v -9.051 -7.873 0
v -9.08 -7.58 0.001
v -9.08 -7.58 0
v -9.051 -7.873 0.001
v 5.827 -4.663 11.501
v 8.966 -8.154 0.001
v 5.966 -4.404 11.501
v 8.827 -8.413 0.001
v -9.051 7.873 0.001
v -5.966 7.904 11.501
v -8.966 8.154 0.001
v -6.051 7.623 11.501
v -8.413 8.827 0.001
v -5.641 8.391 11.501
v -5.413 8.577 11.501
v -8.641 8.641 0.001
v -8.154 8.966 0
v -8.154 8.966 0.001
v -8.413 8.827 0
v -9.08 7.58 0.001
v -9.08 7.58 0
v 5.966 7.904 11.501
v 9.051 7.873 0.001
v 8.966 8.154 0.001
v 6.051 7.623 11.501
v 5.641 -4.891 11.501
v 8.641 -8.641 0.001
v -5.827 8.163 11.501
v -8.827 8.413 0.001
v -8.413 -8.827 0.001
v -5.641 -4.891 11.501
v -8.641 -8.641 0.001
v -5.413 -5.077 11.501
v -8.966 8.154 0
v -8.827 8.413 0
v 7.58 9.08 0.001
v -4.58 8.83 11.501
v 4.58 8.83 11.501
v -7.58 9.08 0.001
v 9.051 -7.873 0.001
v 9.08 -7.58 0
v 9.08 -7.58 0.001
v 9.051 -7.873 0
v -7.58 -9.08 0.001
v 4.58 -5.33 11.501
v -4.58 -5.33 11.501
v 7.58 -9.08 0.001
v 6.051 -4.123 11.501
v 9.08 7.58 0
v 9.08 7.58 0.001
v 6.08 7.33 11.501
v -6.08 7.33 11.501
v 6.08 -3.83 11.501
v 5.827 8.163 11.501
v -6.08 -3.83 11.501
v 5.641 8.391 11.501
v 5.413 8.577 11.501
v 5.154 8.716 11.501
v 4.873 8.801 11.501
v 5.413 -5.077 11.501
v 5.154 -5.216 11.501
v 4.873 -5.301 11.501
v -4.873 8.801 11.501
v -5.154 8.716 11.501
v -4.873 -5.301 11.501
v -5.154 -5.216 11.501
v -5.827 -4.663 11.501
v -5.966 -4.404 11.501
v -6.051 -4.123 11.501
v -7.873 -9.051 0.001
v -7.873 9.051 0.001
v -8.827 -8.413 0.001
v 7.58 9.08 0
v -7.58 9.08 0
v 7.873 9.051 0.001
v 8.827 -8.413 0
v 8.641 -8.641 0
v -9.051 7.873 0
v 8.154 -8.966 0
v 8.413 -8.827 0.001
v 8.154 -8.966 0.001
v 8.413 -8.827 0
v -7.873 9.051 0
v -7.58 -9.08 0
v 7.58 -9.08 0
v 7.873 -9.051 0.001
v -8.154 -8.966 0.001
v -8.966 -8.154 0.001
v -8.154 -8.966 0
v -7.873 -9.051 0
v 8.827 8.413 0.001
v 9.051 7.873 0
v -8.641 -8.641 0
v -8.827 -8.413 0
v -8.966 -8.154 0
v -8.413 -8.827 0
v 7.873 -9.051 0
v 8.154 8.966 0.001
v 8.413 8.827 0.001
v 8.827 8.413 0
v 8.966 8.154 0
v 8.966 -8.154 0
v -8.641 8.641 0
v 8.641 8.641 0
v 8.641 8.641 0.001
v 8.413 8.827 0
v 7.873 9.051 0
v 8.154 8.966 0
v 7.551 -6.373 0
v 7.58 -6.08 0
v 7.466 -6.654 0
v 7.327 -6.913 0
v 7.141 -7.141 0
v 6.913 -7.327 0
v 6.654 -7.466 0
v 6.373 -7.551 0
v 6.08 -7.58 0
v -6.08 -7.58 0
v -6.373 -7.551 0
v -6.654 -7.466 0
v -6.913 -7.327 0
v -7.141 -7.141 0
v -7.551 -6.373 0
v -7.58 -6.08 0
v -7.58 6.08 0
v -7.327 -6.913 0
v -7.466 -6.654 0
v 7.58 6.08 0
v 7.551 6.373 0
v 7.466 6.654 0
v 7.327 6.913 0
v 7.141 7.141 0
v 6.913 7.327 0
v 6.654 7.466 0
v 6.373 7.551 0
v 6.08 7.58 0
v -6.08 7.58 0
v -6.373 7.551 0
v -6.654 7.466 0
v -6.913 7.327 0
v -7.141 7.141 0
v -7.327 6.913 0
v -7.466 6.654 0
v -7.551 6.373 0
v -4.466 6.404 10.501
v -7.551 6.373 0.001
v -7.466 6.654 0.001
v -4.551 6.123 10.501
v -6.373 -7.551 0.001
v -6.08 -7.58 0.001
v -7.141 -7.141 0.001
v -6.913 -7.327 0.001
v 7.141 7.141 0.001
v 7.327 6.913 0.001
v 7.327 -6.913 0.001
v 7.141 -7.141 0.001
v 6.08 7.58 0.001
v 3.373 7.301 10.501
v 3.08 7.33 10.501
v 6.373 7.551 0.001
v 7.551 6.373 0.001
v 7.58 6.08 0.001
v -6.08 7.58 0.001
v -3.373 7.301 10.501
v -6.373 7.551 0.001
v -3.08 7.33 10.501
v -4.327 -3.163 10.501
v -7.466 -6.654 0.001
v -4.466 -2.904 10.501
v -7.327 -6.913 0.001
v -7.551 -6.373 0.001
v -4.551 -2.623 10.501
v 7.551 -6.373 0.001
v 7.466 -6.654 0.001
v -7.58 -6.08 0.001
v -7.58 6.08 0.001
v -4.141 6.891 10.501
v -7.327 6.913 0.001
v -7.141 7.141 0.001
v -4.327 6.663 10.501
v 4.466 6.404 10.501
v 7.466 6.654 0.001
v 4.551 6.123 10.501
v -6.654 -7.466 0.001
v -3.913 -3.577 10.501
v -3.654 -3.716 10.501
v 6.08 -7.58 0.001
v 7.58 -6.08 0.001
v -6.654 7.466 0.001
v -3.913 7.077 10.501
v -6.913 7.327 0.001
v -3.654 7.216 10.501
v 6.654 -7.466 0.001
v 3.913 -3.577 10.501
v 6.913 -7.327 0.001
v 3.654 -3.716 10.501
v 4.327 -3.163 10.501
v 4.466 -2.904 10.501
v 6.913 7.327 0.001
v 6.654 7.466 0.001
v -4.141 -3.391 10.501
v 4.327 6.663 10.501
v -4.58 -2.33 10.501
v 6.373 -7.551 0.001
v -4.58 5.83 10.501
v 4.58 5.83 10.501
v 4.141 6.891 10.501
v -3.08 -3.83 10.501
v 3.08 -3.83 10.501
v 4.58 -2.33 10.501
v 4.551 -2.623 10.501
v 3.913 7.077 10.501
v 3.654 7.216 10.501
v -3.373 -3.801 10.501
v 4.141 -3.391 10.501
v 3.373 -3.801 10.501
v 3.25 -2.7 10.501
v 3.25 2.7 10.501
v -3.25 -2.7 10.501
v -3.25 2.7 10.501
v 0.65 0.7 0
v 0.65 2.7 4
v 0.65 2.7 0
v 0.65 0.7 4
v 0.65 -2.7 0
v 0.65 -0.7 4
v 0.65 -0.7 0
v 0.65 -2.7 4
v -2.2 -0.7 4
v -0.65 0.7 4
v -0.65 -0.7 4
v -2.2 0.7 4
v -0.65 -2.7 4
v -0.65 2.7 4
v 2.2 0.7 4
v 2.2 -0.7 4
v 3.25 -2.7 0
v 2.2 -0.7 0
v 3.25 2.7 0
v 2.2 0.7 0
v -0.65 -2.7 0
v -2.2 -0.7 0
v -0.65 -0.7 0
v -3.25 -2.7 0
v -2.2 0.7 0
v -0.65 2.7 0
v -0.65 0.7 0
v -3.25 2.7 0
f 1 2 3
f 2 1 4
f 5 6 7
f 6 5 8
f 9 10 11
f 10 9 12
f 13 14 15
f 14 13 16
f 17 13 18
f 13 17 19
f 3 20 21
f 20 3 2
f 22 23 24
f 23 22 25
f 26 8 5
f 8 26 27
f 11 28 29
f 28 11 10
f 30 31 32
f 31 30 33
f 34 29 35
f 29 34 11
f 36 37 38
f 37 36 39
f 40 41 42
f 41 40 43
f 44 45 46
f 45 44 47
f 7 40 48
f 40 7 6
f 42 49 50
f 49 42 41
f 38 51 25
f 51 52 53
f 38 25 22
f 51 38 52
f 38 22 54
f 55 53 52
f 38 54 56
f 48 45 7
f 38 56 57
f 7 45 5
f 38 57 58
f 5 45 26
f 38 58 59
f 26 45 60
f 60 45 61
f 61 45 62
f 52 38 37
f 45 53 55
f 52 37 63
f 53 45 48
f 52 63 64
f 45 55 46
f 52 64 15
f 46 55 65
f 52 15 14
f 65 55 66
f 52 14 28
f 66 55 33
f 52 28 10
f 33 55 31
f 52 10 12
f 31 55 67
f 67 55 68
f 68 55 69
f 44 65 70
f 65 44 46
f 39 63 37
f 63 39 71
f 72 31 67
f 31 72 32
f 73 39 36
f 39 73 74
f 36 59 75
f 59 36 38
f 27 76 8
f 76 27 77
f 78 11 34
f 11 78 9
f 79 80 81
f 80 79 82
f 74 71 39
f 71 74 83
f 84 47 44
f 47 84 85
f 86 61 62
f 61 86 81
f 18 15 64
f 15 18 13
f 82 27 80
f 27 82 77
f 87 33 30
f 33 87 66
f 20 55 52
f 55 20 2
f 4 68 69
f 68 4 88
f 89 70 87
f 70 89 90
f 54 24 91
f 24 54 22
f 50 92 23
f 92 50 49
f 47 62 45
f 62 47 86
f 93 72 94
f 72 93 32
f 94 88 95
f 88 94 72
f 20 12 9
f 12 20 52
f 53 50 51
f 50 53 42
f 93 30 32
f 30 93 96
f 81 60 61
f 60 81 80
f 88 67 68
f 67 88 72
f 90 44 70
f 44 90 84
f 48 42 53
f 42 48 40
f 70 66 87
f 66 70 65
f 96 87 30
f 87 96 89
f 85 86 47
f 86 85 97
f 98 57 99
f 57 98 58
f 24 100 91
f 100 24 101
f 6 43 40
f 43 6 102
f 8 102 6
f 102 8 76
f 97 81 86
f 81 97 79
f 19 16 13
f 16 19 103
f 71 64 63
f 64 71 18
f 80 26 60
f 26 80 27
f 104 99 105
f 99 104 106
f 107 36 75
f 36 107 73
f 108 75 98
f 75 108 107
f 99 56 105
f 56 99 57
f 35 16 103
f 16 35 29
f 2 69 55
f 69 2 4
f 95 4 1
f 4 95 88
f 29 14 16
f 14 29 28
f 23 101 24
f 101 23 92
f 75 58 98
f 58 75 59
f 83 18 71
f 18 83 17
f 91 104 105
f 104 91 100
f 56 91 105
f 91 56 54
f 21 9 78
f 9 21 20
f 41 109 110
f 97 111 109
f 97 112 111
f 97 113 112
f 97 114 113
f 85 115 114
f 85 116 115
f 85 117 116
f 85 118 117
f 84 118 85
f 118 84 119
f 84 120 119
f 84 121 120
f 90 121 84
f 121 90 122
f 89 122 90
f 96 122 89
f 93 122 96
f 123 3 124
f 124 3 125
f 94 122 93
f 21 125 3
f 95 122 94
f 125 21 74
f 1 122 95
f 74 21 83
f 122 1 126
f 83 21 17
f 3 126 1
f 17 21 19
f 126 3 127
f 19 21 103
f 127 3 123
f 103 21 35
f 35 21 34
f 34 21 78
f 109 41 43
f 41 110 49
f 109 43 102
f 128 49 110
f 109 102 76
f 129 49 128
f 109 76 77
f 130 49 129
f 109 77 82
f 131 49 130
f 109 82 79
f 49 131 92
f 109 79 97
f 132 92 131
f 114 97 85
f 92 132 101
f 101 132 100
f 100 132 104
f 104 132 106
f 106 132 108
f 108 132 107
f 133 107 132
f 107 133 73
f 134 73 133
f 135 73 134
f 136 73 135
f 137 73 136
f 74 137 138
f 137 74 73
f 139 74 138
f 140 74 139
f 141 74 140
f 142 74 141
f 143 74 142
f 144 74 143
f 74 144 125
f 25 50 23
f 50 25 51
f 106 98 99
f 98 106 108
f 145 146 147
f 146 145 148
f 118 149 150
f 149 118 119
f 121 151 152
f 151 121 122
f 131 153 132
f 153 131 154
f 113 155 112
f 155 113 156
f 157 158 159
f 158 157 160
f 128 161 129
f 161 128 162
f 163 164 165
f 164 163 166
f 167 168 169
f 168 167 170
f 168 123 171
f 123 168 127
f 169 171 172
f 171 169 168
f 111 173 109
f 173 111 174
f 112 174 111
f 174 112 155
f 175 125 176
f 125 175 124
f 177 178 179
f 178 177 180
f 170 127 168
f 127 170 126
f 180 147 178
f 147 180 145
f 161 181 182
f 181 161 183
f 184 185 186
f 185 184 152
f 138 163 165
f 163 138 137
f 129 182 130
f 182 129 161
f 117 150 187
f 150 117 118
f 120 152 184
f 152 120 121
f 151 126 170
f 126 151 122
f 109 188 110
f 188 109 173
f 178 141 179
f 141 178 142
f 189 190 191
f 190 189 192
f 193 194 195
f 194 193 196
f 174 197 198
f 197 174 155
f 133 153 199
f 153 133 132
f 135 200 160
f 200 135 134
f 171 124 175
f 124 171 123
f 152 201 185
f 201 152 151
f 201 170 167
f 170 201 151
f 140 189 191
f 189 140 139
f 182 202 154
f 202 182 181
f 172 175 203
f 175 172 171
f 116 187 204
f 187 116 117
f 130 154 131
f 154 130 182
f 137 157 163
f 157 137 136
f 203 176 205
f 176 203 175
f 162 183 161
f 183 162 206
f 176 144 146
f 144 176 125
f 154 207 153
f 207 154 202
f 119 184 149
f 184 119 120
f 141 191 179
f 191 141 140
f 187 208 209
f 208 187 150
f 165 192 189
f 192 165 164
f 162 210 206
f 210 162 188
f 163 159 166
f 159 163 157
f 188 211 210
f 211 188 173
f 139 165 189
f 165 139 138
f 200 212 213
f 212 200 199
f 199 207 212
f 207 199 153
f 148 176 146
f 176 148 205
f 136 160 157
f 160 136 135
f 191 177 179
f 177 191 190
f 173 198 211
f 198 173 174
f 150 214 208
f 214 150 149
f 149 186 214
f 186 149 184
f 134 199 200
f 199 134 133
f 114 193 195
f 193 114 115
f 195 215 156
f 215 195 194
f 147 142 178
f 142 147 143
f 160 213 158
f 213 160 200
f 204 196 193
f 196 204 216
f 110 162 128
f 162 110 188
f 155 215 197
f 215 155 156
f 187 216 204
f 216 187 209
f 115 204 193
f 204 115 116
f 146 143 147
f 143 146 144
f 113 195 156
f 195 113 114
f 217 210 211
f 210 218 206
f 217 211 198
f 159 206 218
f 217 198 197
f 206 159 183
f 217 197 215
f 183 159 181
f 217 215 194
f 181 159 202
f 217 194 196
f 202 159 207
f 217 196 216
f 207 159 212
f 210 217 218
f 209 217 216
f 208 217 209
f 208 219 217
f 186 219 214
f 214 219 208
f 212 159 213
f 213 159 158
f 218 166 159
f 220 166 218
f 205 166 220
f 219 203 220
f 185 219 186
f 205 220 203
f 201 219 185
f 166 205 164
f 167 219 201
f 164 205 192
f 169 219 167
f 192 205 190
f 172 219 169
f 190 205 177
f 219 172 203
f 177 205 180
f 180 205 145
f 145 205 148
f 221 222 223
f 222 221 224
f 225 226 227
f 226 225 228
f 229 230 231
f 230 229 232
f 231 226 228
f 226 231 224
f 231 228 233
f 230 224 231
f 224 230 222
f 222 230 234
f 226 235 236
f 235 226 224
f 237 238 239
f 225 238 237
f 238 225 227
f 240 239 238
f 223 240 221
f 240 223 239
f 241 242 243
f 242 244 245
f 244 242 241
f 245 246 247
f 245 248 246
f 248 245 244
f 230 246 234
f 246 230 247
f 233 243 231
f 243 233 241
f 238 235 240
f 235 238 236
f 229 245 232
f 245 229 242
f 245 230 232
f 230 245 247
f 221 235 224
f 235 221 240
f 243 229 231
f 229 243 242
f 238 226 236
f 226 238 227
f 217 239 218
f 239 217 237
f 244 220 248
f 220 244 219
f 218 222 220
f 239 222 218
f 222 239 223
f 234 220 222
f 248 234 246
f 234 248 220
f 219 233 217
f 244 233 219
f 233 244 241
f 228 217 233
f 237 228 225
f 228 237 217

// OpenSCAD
/* [Key] */

//length in units of key
key_length = 1;
//height in units of key. should remain 1 for most uses
key_height = 1;
//keycap type, [0:DCS Row 5, 1:DCS Row 1, 2:DCS Row 2, 3:DCS Row 3, 4:DCS Row 4, 5:DSA Row 3, 6:SA Row 1, 7:SA Row 2, 8:SA Row 3, 9:SA Row 4, 10:DCS Row 4 Spacebar, 11: g20 key (faked)]
key_profile_index = 0;

// keytop thickness, aka how many millimeters between the inside and outside of the top surface of the key
keytop_thickness = 1;

// wall thickness, aka the thickness of the sides of the keycap. note this is the total thickness, aka 3 = 1.5mm walls
wall_thickness = 3;

/* [Brim] */
//enable brim for connector
has_brim = 0;
//brim radius. 11 ensconces normal keycap stem in normal keycap
brim_radius = 11;
//brim depth
brim_depth = .3;

/* [Stabilizers] */
//whether stabilizer connectors are enabled
stabilizers = 0;
//stabilizer distance in mm
stabilizer_distance = 50;

/* [Dish] */
// invert dishing. mostly for spacebar
inverted_dish = 0;

/* [Stem] */
// cherry MX or Alps stem, or totally broken circular cherry stem [0..2]
stem_profile = 0;
// how inset the stem is from the bottom of the key. experimental. requires support
stem_inset = 0;
// stem offset in units NOT MM. for stepped caps lock
stem_offset = 0;

/* [Hidden] */
//change to round things better
$fn = 32;
//beginning to use unit instead of baked in 19.05
unit = 19.05;

//minkowski radius. radius of sphere used in minkowski sum for minkowski_key function. 1.75 default for faux G20
minkowski_radius = 1.75;

letter = "3";
letter2 = "#";
key_type = 2;
print_text_only = 0;
//profile specific stuff

/*  *****************************************************
    ** RUNNING AREA                                     *
    **                                                  *
    ** Because of a lack of multi-material support      *
    ** we need to run the key creator and text creator  *
    ** separately and save each for merging on a slicer *
    **                                                  *
    ** doKeyList will take the text from keys and print *
    ** single character keys                            *
    **                                                  *
    ** doDoubleKeyList will take the text from          *
    ** doubleKeys and print a two part key with the     *
    ** text in either corner of the key                 *
    *****************************************************/
    
//keys = ["Z", "X", "C", "V", "B", "N", "M"];
keys = [""];
//doubleKeys = [["<","["],[">","]"],["+","="],["~","^"],["%","@"],["?",","],[".",";"],["/",":"],["*","\\"]];
doubleKeys = [["+","+"]];

//color("red") doKeyList();
//color("white") children();

//doDoubleKeyList(1);
doKeyList(0);
//key();

/*
 Here we have, for lack of a better implementation, an array
 that defines the more intimate aspects of a key.
 order is thus:
 1. Bottom Key Width: width of the immediate bottom of the key
 2. Bottom Key Height: height of the immediate bottom of the key
 3. Top Key Width Difference: mm to subtract from bottom key width to create top key width
 4. Top Key Height Difference: mm to subtract from bottom key height to create top key height
 5. total Depth: how tall the total in the switch is before dishing
 6. Top Tilt: X rotation of the top. Top and dish obj are rotated
 7. Top Skew: Y skew of the top of the key relative to the bottom. DCS has some, DSA has none (its centered)
 8. Dish Type: type of dishing. check out dish function for the options
 9. Dish Depth: how many mm to cut into the key with
 10. Dish Radius: radius of dish obj, the Sphere or Cylinder that cuts into the keycap
*/

key_profiles = [

	//DCS Profile

	[ //DCS ROW 5
		18.16,  // Bottom Key Width
		18.16,  // Bottom Key Height
		6,   // Top Key Width Difference
		4,   // Top Key Height Difference
		11.5, // total Depth
		-6,  // Top Tilt
		1.75,// Top Skew

		//Dish Profile

		0,   // Dish Type
		1,   // Dish Depth
		0,   // Dish Skew X
		0    // DIsh Skew Y
	],
	[ //DCS ROW 1
		18.16,  // Bottom Key Width
		18.16,  // Bottom Key Height
		6,   // Top Key Width Difference
		4,   // Top Key Height Difference
		8.5, // total Depth
		-1,  // Top Tilt
		1.75,// Top Skew

		//Dish Profile

		0,   // Dish Type
		1,   // Dish Depth
		0,   // Dish Skew X
		0    // DIsh Skew Y
	],
	[ //DCS ROW 2
		18.16,  // Bottom Key Width
		18.16,  // Bottom Key Height
		6.2,   // Top Key Width Difference
		4,   // Top Key Height Difference
		7.5, // total Depth
		3,  // Top Tilt
		1.75,// Top Skew

		//Dish Profile

		0,   // Dish Type
		1,   // Dish Depth
		0,   // Dish Skew X
		0    // DIsh Skew Y
	],
	[ //DCS ROW 3
		18.16,  // Bottom Key Width
		18.16,  // Bottom Key Height
		6,   // Top Key Width Difference
		4,   // Top Key Height Difference
		6.2, // total Depth
		7,  // Top Tilt
		1.75,// Top Skew

		//Dish Profile

		0,   // Dish Type
		1,   // Dish Depth
		0,   // Dish Skew X
		0    // DIsh Skew Y
	],
	[ //DCS ROW 4
		18.16,  // Bottom Key Width
		18.16,  // Bottom Key Height
		6,   // Top Key Width Difference
		4,   // Top Key Height Difference
		6.2, // total Depth
		16,  // Top Tilt
		1.75,// Top Skew

		//Dish Profile

		0,   // Dish Type
		1,   // Dish Depth
		0,   // Dish Skew X
		0    // DIsh Skew Y
	],

	//DSA Profile

	[ //DSA ROW 3
	  18.4,  // Bottom Key Width
	  18.4,  // Bottom Key Height
	  5.7, // Top Key Width Difference
	  5.7, // Top Key Height Difference
	  7.4, // total Depth
	  0,   // Top Tilt
	  0,   // Top Skew

	  //Dish Profile

	  1,   // Dish Type
	  1.2, // Dish Depth
	  0,   // Dish Skew X
	  0    // DIsh Skew Y
	],

	//SA Proile

	[ //SA ROW 1
		18.4,  // Bottom Key Width
	  18.4,  // Bottom Key Height
	  5.7, // Top Key Width Difference
	  5.7, // Top Key Height Difference
	  13.73, // total Depth, fudged
	  -14,   // Top Tilt
	  0,   // Top Skew

	  //Dish Profile

	  1,   // Dish Type
	  1.2, // Dish Depth
	  0,   // Dish Skew X
	  0    // DIsh Skew Y
	],
	[ //SA ROW 2
		18.4,  // Bottom Key Width
	  18.4,  // Bottom Key Height
	  5.7, // Top Key Width Difference
	  5.7, // Top Key Height Difference
	  11.73, // total Depth
	  -7,   // Top Tilt
	  0,   // Top Skew

	  //Dish Profile

	  1,   // Dish Type
	  1.2, // Dish Depth
	  0,   // Dish Skew X
	  0    // DIsh Skew Y
	],
	[ //SA ROW 3
		18.4,  // Bottom Key Width
	  18.4,  // Bottom Key Height
	  5.7, // Top Key Width Difference
	  5.7, // Top Key Height Difference
	  11.73, // total Depth
	  0,   // Top Tilt
	  0,   // Top Skew

	  //Dish Profile

	  1,   // Dish Type
	  1.2, // Dish Depth
	  0,   // Dish Skew X
	  0    // DIsh Skew Y
	],
	[ //SA ROW 4
		18.4,  // Bottom Key Width
	  18.4,  // Bottom Key Height
	  5.7, // Top Key Width Difference
	  5.7, // Top Key Height Difference
	  11.73, // total Depth
	  7,   // Top Tilt
	  0,   // Top Skew

	  //Dish Profile

	  1,   // Dish Type
	  1.2, // Dish Depth
	  0,   // Dish Skew X
	  0    // DIsh Skew Y
	],
	[ //DCS ROW 4 SPACEBAR
		18.16,  // Bottom Key Width
		18.16,  // Bottom Key Height
		6,   // Top Key Width Difference
		4,   // Top Key Height Difference
		6.2, // total Depth
		16,  // Top Tilt
		1.75,// Top Skew

		//Dish Profile

		2,   // Dish Type
		1,   // Dish Depth
		0,   // Dish Skew X
		0    // DIsh Skew Y
	],
	[ //G20 AKA DCS Row 2 with no dish and shorter
		18.16,  // Bottom Key Width
		18.16,  // Bottom Key Height
		2,   // Top Key Width Difference
		2,   // Top Key Height Difference
		6, // total Depth
		2.5,  // Top Tilt
		0.75,// Top Skew

		//Dish Profile

		3,   // Dish Type
		0,   // Dish Depth
		0,   // Dish Skew X
		0    // DIsh Skew Y
	],
	[ //NONWORKING fake ISO enter
		18.16 * 1.5,  // Bottom Key Width
		18.16 * 2,  // Bottom Key Height
		4,   // Top Key Width Difference
		4,   // Top Key Height Difference
		7, // total Depth
		0,  // Top Tilt
		1.75,// Top Skew

		//Dish Profile

		0,   // Dish Type
		1,   // Dish Depth
		0,   // Dish Skew X
		0    // DIsh Skew Y
	],
];

// derived variables
//key profile selected
key_profile = key_profiles[key_profile_index];

// names, so I don't go crazy
bottom_key_width = key_profile[0];
bottom_key_height = key_profile[1];
width_difference = key_profile[2];
height_difference = key_profile[3];
total_depth = key_profile[4];
top_tilt = key_profile[5] / key_height;
top_skew = key_profile[6];
dish_type = key_profile[7];
dish_depth = key_profile[8];
dish_skew_x = key_profile[9];
dish_skew_y = key_profile[10];

// actual mm key width and height
total_key_width = bottom_key_width + (unit * (key_length - 1));
total_key_height = bottom_key_height + (unit * (key_height - 1));

// actual mm key width and height at the top
top_total_key_width = bottom_key_width + (unit * (key_length - 1)) - width_difference;
top_total_key_height = bottom_key_height + (unit * (key_height - 1)) - height_difference;

//centered
module roundedRect(size, radius) {
	x = size[0];
	y = size[1];
	z = size[2];

	translate([-x/2,-y/2,0])
	linear_extrude(height=z)
	hull() {
		translate([radius, radius, 0])
		circle(r=radius);

		translate([x - radius, radius, 0])
		circle(r=radius);

		translate([x - radius, y - radius, 0])
		circle(r=radius);

		translate([radius, y - radius, 0])
		circle(r=radius);
	}
}

// stem related stuff

// bottom we can use to anchor the stem, just a big ol cube with the inside of
// the keycap hollowed out
module inside(){
	difference(){
		translate([0,0,50]) cube([100000,100000,100000],center=true);
		// NOTE: you're saying hey, if this is the inside why aren't we doing
		// wall_thickness, keytop_thickness? well first off congratulations for
		// figuring that out cuz it's a rat's nest in here. second off
		// due to how the minkowski_key function works that isn't working out right
		// now. it's a simple change if is_minkowski is implemented though
		shape(0, 0);
	}
}

module cherry_stem(){
	// cross length
	cross_length = 4.4;
  //extra vertical cross length - the extra length of the up/down bar of the cross
  extra_vertical_cross_length = 1.1;
	//dimensions of connector
	// outer cross extra length in x
	extra_outer_cross_width = 2.10;
	// outer cross extra length in y
	extra_outer_cross_height = 1.0;
	// dimensions of cross
	// horizontal cross bar width
	horizontal_cross_width = 1.4;
	// vertical cross bar width
	vertical_cross_width = 1.3;
	// cross depth, stem height is 3.4mm
	cross_depth = 4;

	difference(){
		union(){
            if (stem_profile != 2){
                translate([
                    -(cross_length+extra_outer_cross_width)/2,
                    -(cross_length+extra_outer_cross_height)/2,
                    stem_inset
                ])
    			cube([ // the base of the stem, the part the cruciform digs into
					cross_length+extra_outer_cross_width,
					cross_length+extra_outer_cross_height,
					50
    			]);
            } else {
                cylinder(
                    d = cross_length+extra_outer_cross_height,
                    h = 50
                );
            }
			if (has_brim == 1){ cylinder(r=brim_radius,h=brim_depth); }
		}
		//the cross part of the steam
		translate([0,0,(cross_depth)/2 + stem_inset]){
	        cube([vertical_cross_width,cross_length+extra_vertical_cross_length,cross_depth], center=true );
	        cube([cross_length,horizontal_cross_width,cross_depth], center=true );
	    }
	}
}

module alps_stem(){
	cross_depth = 40;
	width = 4.45;
	height = 2.25;

	base_width = 12;
	base_height = 15;

	translate([0,0,cross_depth/2 + stem_inset]){
		cube([width,height,cross_depth], center = true);
	}
}

//whole connector, alps or cherry, trimmed to fit
module connector(has_brim){
	difference(){
		//TODO can I really not do an array index here?
		translate([-unit * stem_offset, 0, 0])
		union(){
            if (key_length == 2) {
                if(stem_profile == 0 || stem_profile == 2) translate([12,0,0]) cherry_stem();
                if(stem_profile == 0 || stem_profile == 2) translate([-12,0,0]) cherry_stem();
            } else {
                if(stem_profile == 0 || stem_profile == 2) cherry_stem();
            }
            if(key_length == 10) {
                if(stem_profile == 0 || stem_profile == 2) cherry_stem();
                if(stem_profile == 0 || stem_profile == 2) translate([50,0,0]) cherry_stem();
                if(stem_profile == 0 || stem_profile == 2) translate([-50,0,0]) cherry_stem();
            }
            
			if(stem_profile == 1) alps_stem();
		}
		inside();
	}
}

//stabilizer connectors
module stabilizer_connectors(has_brim){
	translate([stabilizer_distance,0,0]) connector(has_brim);
	translate([-stabilizer_distance,0,0]) connector(has_brim);
}



//shape related stuff




//general shape of key. used for inside and outside
module shape(thickness_difference, depth_difference){
  if (inverted_dish == 1){
		difference(){
			union(){
				shape_hull(thickness_difference, depth_difference, 1);
				dish(depth_difference);
			}
			outside(thickness_difference);
		}
	} else{
		difference(){
			shape_hull(thickness_difference, depth_difference, 1);
			//dish(depth_difference);
		}
	}
}

// conicalish clipping shape to trim things off the outside of the keycap
// literally just a key with height of 2 to make sure nothing goes awry with dishing etc
module outside(thickness_difference){
	difference(){
		cube([100000,100000,100000],center = true);
		shape_hull(thickness_difference, 0, 2);
	}
}

// super basic hull shape without dish
// modifier multiplies the height and top differences of the shape,
// which is only used for dishing to cut the dish off correctly
// height_difference used for keytop thickness
module shape_hull(thickness_difference, depth_difference, modifier){
	hull(){
		// bottom_key_width + (key_length -1) * unit is the correct length of the
		// key. only 1u of the key should be bottom_key_width long; all others
		// should be 1u
		roundedRect([total_key_width - thickness_difference, total_key_height - thickness_difference, .001],1.5);

		//height_difference outside of modifier because that doesnt make sense
		translate([0,top_skew,total_depth * modifier - depth_difference])
		//rotate([-top_tilt,0,0])
		roundedRect([total_key_width - thickness_difference - width_difference * modifier, total_key_height - thickness_difference - height_difference * modifier, .001],1.5);
	}
}



//dish related stuff



//dish selector
module dish(depth_difference){
	if(dish_type == 0){ // cylindrical dish
		cylindrical_dish(depth_difference);
	}
	else if (dish_type == 1) { // spherical dish
		spherical_dish(depth_difference);
	}
	else if (dish_type == 2){ // SIDEWAYS cylindrical dish - used for spacebar
		sideways_cylindrical_dish(depth_difference);
	}
  else if (dish_type == 3){
  	// no dish
  }
}

module cylindrical_dish(depth_difference){
	/* we do some funky math here
	 * basically you want to have the dish "dig in" to the keycap x millimeters
	 * in order to do that you have to solve a small (2d) system of equations
	 * where the chord of the spherical cross section of the dish is
	 * the width of the keycap.
	 */
	// the distance you have to move the dish up so it digs in dish_depth millimeters
	chord_length = (pow(top_total_key_width, 2) - 4 * pow(dish_depth, 2)) / (8 * dish_depth);
	//the radius of the dish
	rad = (pow(top_total_key_width, 2) + 4 * pow(dish_depth, 2)) / (8 * dish_depth);

	if (inverted_dish == 1){
		translate([dish_skew_x, top_skew + dish_skew_y, total_depth - depth_difference])
		rotate([90-top_tilt,0,0])
		translate([0,-chord_length,0])
		cylinder(h=100,r=rad, $fn=1024, center=true);
	}
	else{
		translate([dish_skew_x, top_skew + dish_skew_y, total_depth - depth_difference])
		rotate([90-top_tilt,0,0])
		translate([0,chord_length,0])
		cylinder(h=100,r=rad, $fn=1024, center=true);
	}

}

module spherical_dish(depth_difference){
	//same thing as the cylindrical dish here, but we need the corners to just touch - so we have to find the hypotenuse of the top
	chord = pow((pow(top_total_key_width,2) + pow(top_total_key_height, 2)),0.5); //getting diagonal of the top

	// the distance you have to move the dish up so it digs in dish_depth millimeters
	chord_length = (pow(chord, 2) - 4 * pow(dish_depth, 2)) / (8 * dish_depth);
	//the radius of the dish
	rad = (pow(chord, 2) + 4 * pow(dish_depth, 2)) / (8 * dish_depth);

	if (inverted_dish == 1){
		translate([dish_skew_x, top_skew + dish_skew_y, total_depth - depth_difference])
		rotate([-top_tilt,0,0])
		translate([0,0,-chord_length])
		//NOTE: if your dish is long at all you might need to increase this number
		sphere(r=rad, $fn=512);
	}
	else{
		translate([dish_skew_x, top_skew + dish_skew_y, total_depth - depth_difference])
		rotate([-top_tilt,0,0])
		translate([0,0,chord_length])
		sphere(r=rad, $fn=256);
	}
}

module sideways_cylindrical_dish(depth_difference){
	chord_length = (pow(top_total_key_height, 2) - 4 * pow(dish_depth, 2)) / (8 * dish_depth);
	rad = (pow(top_total_key_height, 2) + 4 * pow(dish_depth, 2)) / (8 * dish_depth);

	if (inverted_dish == 1){
		translate([dish_skew_x, top_skew + dish_skew_y, total_depth - depth_difference])
		rotate([90,top_tilt,90])
		translate([0,-chord_length,0])
		cylinder(h=total_key_width + 20,r=rad, $fn=1024, center=true); // +20 just cuz
	}
	else{
		translate([dish_skew_x, top_skew + dish_skew_y, total_depth - depth_difference])
		rotate([90,top_tilt,90])
		translate([0,chord_length,0])
		cylinder(h=total_key_width + 20,r=rad, $fn=1024, center=true);
	}
}

module keyText(letter, letter2, key_type) {
    if (key_type == 1) {
        if (len(letter) > 1) {
            singleKeyText(letter, 0.5, 3);
        } else {
            singleKeyText(letter, 0.5);
        }
    } else {
        doubleKeyText(letter, letter2);
    }
}

module singleKeyText(letter = "Q", embed = 0.5, textSize = 5, tx = 0, ty = 1, tz = 11.1) {    
    translate([tx,ty,tz])
        //rotate([5,0,0])
    linear_extrude(height=embed, convexity=4)
        color("white") text(letter, 
             size=textSize,
             font="Arial:style=Bold",
             halign="center",
             valign="center");
}

module doubleKeyText(letter1, letter2, embed = 0.5) {
    singleKeyText(letter1, embed, 4, -3, 5, 11.1);
    singleKeyText(letter2, embed, 4, 3, -2, 11.1);
    
    /*translate([-3,5,11.1]) {
        //rotate([5,0,0])
        // convexity is needed for correct preview
        // since characters can be highly concave
        linear_extrude(height=embed, convexity=4)
            text(letter1, 
                 size=4,
                 font="Arial:style=Bold",
                 halign="center",
                 valign="center");
    }
    translate([3,-2,11.1]) {
        // convexity is needed for correct preview
        // since characters can be highly concave
        //rotate([5,0,0])
        linear_extrude(height=embed, convexity=4)
            text(letter2, 
                 size=4,
                 font="Arial:style=Bold",
                 halign="center",
                 valign="center");
    }*/
}

//actual full key with space carved out and keystem/stabilizer connectors
module key(){
	union(){
		difference(){
			shape(0, 0);
			shape(wall_thickness, keytop_thickness);            
		}
	}

	connector(has_brim);

	if (stabilizers == 1){
		stabilizer_connectors(has_brim);
	}
}

// ACTUAL OUTPUT
module doKey(letter = "3", letter2 = "#", key_type = 2, print_text_only = 0) {
    if (print_text_only == 0) {
        difference(){
            key();
            // preview cube, for seeing inside the keycap
            //cube([100,100,100]);
            keyText(letter, letter2, key_type);
        }
    } else {
        keyText(letter, letter2, key_type);
    }
}

module doDoubleKeyList(hideButton = 0) {
    x = 0;
    y = 0;
    
    for (i = [0:len(doubleKeys)-1]) {   
        x = 20 * (i % 4);            
        y = 20 * (round((20 * i) / 80));

        translate([x,y,0])
            doKey(doubleKeys[i][0], doubleKeys[i][1], 2, hideButton);
    }
}

module doKeyList(hideButton = 0) {
    x = 0;
    y = 0;
    
    for (i = [0:len(keys)-1]) {   
        x = 20 * (i % 4);            
        y = 20 * (round((20 * i) / 80));

        translate([x,y,0])
            doKey(keys[i], "", 1, hideButton);
    }
}

//color("white") children();

module children() {
    x = 0;
    y = 0;

    do_letter_only = 1;

    for (i = [0:len(keys)-1]) {   

        x = 20 * (i % 4);            
        y = 20 * (round((20 * i) / 80));
        
        translate([x,y,-0.09])
            doKey(keys[i], "", 1, do_letter_only);
    }
}
//minkowski_key();




// Experimental stuff


// key rounded with minkowski sum. still supports wall and keytop thickness.
// use in actual output section. takes a long time to render with dishes.
// required for keycap 11, G20 keycap.
module minkowski_key(){
	union(){
		difference(){
			minkowski(){
				shape(minkowski_radius*2, minkowski_radius);
				difference(){
					sphere(r=minkowski_radius, $fn=24);
					translate([0,0,-minkowski_radius])
						cube([2*minkowski_radius,2*minkowski_radius,2*minkowski_radius], center=true);
				}
			}
			shape(wall_thickness, keytop_thickness);
		}
	}

	connector(has_brim);

	if (stabilizers == 1){
		stabilizer_connectors(has_brim);
	}
}


// NOT 3D, NOT CENTERED
// corollary is roundedRect
module fakeISOEnter(thickness_difference){
    z = 0.001;
    radius = 2;
		/*TODO I figured it out. 18.16 is the actual keycap width / height,
		whereas 19.01 is the unit. ISO enter obeys that just like everything else,
		which means that it's height is 18.16 * 2 + (19.01 - 18.16) or, two
		keycap heights plus the space between them, also known as 18.16 +
		(19.01 * (key_height - 1)). this is followed by the width too. should fix
		to make this finally work*/
    unit = 18.16; // TODO probably not

		// t is all modifications to the polygon array
		t = radius + thickness_difference/2;

    pointArray = [
        [0 + t,0 + t],
        [unit*1.25 - t, 0 + t],
        [unit*1.25  - t, unit*2  - t],
        [unit*-.25 + t, unit*2  - t],
        [unit*-.25 + t, unit*1  + t],
        [0 + t, unit*1  + t]
    ];

    minkowski(){
        circle(r=radius, $fn=24);
        polygon(points=pointArray);
    }
}

//corollary is shape_hull
module ISOEnterShapeHull(thickness_difference, depth_difference, modifier){
    unit = 18.16; // TODO probably not
		height = 8 - depth_difference;
		length = 1.5 * unit; // TODO not used. need for dish

    translate([-0.125 * unit, unit*.5]) linear_extrude(height=height*modifier, scale=[.8, .9]){
        translate([-unit*.5, -unit*1.5]) minkowski(){
            fakeISOEnter(thickness_difference);
        }
    }
}
